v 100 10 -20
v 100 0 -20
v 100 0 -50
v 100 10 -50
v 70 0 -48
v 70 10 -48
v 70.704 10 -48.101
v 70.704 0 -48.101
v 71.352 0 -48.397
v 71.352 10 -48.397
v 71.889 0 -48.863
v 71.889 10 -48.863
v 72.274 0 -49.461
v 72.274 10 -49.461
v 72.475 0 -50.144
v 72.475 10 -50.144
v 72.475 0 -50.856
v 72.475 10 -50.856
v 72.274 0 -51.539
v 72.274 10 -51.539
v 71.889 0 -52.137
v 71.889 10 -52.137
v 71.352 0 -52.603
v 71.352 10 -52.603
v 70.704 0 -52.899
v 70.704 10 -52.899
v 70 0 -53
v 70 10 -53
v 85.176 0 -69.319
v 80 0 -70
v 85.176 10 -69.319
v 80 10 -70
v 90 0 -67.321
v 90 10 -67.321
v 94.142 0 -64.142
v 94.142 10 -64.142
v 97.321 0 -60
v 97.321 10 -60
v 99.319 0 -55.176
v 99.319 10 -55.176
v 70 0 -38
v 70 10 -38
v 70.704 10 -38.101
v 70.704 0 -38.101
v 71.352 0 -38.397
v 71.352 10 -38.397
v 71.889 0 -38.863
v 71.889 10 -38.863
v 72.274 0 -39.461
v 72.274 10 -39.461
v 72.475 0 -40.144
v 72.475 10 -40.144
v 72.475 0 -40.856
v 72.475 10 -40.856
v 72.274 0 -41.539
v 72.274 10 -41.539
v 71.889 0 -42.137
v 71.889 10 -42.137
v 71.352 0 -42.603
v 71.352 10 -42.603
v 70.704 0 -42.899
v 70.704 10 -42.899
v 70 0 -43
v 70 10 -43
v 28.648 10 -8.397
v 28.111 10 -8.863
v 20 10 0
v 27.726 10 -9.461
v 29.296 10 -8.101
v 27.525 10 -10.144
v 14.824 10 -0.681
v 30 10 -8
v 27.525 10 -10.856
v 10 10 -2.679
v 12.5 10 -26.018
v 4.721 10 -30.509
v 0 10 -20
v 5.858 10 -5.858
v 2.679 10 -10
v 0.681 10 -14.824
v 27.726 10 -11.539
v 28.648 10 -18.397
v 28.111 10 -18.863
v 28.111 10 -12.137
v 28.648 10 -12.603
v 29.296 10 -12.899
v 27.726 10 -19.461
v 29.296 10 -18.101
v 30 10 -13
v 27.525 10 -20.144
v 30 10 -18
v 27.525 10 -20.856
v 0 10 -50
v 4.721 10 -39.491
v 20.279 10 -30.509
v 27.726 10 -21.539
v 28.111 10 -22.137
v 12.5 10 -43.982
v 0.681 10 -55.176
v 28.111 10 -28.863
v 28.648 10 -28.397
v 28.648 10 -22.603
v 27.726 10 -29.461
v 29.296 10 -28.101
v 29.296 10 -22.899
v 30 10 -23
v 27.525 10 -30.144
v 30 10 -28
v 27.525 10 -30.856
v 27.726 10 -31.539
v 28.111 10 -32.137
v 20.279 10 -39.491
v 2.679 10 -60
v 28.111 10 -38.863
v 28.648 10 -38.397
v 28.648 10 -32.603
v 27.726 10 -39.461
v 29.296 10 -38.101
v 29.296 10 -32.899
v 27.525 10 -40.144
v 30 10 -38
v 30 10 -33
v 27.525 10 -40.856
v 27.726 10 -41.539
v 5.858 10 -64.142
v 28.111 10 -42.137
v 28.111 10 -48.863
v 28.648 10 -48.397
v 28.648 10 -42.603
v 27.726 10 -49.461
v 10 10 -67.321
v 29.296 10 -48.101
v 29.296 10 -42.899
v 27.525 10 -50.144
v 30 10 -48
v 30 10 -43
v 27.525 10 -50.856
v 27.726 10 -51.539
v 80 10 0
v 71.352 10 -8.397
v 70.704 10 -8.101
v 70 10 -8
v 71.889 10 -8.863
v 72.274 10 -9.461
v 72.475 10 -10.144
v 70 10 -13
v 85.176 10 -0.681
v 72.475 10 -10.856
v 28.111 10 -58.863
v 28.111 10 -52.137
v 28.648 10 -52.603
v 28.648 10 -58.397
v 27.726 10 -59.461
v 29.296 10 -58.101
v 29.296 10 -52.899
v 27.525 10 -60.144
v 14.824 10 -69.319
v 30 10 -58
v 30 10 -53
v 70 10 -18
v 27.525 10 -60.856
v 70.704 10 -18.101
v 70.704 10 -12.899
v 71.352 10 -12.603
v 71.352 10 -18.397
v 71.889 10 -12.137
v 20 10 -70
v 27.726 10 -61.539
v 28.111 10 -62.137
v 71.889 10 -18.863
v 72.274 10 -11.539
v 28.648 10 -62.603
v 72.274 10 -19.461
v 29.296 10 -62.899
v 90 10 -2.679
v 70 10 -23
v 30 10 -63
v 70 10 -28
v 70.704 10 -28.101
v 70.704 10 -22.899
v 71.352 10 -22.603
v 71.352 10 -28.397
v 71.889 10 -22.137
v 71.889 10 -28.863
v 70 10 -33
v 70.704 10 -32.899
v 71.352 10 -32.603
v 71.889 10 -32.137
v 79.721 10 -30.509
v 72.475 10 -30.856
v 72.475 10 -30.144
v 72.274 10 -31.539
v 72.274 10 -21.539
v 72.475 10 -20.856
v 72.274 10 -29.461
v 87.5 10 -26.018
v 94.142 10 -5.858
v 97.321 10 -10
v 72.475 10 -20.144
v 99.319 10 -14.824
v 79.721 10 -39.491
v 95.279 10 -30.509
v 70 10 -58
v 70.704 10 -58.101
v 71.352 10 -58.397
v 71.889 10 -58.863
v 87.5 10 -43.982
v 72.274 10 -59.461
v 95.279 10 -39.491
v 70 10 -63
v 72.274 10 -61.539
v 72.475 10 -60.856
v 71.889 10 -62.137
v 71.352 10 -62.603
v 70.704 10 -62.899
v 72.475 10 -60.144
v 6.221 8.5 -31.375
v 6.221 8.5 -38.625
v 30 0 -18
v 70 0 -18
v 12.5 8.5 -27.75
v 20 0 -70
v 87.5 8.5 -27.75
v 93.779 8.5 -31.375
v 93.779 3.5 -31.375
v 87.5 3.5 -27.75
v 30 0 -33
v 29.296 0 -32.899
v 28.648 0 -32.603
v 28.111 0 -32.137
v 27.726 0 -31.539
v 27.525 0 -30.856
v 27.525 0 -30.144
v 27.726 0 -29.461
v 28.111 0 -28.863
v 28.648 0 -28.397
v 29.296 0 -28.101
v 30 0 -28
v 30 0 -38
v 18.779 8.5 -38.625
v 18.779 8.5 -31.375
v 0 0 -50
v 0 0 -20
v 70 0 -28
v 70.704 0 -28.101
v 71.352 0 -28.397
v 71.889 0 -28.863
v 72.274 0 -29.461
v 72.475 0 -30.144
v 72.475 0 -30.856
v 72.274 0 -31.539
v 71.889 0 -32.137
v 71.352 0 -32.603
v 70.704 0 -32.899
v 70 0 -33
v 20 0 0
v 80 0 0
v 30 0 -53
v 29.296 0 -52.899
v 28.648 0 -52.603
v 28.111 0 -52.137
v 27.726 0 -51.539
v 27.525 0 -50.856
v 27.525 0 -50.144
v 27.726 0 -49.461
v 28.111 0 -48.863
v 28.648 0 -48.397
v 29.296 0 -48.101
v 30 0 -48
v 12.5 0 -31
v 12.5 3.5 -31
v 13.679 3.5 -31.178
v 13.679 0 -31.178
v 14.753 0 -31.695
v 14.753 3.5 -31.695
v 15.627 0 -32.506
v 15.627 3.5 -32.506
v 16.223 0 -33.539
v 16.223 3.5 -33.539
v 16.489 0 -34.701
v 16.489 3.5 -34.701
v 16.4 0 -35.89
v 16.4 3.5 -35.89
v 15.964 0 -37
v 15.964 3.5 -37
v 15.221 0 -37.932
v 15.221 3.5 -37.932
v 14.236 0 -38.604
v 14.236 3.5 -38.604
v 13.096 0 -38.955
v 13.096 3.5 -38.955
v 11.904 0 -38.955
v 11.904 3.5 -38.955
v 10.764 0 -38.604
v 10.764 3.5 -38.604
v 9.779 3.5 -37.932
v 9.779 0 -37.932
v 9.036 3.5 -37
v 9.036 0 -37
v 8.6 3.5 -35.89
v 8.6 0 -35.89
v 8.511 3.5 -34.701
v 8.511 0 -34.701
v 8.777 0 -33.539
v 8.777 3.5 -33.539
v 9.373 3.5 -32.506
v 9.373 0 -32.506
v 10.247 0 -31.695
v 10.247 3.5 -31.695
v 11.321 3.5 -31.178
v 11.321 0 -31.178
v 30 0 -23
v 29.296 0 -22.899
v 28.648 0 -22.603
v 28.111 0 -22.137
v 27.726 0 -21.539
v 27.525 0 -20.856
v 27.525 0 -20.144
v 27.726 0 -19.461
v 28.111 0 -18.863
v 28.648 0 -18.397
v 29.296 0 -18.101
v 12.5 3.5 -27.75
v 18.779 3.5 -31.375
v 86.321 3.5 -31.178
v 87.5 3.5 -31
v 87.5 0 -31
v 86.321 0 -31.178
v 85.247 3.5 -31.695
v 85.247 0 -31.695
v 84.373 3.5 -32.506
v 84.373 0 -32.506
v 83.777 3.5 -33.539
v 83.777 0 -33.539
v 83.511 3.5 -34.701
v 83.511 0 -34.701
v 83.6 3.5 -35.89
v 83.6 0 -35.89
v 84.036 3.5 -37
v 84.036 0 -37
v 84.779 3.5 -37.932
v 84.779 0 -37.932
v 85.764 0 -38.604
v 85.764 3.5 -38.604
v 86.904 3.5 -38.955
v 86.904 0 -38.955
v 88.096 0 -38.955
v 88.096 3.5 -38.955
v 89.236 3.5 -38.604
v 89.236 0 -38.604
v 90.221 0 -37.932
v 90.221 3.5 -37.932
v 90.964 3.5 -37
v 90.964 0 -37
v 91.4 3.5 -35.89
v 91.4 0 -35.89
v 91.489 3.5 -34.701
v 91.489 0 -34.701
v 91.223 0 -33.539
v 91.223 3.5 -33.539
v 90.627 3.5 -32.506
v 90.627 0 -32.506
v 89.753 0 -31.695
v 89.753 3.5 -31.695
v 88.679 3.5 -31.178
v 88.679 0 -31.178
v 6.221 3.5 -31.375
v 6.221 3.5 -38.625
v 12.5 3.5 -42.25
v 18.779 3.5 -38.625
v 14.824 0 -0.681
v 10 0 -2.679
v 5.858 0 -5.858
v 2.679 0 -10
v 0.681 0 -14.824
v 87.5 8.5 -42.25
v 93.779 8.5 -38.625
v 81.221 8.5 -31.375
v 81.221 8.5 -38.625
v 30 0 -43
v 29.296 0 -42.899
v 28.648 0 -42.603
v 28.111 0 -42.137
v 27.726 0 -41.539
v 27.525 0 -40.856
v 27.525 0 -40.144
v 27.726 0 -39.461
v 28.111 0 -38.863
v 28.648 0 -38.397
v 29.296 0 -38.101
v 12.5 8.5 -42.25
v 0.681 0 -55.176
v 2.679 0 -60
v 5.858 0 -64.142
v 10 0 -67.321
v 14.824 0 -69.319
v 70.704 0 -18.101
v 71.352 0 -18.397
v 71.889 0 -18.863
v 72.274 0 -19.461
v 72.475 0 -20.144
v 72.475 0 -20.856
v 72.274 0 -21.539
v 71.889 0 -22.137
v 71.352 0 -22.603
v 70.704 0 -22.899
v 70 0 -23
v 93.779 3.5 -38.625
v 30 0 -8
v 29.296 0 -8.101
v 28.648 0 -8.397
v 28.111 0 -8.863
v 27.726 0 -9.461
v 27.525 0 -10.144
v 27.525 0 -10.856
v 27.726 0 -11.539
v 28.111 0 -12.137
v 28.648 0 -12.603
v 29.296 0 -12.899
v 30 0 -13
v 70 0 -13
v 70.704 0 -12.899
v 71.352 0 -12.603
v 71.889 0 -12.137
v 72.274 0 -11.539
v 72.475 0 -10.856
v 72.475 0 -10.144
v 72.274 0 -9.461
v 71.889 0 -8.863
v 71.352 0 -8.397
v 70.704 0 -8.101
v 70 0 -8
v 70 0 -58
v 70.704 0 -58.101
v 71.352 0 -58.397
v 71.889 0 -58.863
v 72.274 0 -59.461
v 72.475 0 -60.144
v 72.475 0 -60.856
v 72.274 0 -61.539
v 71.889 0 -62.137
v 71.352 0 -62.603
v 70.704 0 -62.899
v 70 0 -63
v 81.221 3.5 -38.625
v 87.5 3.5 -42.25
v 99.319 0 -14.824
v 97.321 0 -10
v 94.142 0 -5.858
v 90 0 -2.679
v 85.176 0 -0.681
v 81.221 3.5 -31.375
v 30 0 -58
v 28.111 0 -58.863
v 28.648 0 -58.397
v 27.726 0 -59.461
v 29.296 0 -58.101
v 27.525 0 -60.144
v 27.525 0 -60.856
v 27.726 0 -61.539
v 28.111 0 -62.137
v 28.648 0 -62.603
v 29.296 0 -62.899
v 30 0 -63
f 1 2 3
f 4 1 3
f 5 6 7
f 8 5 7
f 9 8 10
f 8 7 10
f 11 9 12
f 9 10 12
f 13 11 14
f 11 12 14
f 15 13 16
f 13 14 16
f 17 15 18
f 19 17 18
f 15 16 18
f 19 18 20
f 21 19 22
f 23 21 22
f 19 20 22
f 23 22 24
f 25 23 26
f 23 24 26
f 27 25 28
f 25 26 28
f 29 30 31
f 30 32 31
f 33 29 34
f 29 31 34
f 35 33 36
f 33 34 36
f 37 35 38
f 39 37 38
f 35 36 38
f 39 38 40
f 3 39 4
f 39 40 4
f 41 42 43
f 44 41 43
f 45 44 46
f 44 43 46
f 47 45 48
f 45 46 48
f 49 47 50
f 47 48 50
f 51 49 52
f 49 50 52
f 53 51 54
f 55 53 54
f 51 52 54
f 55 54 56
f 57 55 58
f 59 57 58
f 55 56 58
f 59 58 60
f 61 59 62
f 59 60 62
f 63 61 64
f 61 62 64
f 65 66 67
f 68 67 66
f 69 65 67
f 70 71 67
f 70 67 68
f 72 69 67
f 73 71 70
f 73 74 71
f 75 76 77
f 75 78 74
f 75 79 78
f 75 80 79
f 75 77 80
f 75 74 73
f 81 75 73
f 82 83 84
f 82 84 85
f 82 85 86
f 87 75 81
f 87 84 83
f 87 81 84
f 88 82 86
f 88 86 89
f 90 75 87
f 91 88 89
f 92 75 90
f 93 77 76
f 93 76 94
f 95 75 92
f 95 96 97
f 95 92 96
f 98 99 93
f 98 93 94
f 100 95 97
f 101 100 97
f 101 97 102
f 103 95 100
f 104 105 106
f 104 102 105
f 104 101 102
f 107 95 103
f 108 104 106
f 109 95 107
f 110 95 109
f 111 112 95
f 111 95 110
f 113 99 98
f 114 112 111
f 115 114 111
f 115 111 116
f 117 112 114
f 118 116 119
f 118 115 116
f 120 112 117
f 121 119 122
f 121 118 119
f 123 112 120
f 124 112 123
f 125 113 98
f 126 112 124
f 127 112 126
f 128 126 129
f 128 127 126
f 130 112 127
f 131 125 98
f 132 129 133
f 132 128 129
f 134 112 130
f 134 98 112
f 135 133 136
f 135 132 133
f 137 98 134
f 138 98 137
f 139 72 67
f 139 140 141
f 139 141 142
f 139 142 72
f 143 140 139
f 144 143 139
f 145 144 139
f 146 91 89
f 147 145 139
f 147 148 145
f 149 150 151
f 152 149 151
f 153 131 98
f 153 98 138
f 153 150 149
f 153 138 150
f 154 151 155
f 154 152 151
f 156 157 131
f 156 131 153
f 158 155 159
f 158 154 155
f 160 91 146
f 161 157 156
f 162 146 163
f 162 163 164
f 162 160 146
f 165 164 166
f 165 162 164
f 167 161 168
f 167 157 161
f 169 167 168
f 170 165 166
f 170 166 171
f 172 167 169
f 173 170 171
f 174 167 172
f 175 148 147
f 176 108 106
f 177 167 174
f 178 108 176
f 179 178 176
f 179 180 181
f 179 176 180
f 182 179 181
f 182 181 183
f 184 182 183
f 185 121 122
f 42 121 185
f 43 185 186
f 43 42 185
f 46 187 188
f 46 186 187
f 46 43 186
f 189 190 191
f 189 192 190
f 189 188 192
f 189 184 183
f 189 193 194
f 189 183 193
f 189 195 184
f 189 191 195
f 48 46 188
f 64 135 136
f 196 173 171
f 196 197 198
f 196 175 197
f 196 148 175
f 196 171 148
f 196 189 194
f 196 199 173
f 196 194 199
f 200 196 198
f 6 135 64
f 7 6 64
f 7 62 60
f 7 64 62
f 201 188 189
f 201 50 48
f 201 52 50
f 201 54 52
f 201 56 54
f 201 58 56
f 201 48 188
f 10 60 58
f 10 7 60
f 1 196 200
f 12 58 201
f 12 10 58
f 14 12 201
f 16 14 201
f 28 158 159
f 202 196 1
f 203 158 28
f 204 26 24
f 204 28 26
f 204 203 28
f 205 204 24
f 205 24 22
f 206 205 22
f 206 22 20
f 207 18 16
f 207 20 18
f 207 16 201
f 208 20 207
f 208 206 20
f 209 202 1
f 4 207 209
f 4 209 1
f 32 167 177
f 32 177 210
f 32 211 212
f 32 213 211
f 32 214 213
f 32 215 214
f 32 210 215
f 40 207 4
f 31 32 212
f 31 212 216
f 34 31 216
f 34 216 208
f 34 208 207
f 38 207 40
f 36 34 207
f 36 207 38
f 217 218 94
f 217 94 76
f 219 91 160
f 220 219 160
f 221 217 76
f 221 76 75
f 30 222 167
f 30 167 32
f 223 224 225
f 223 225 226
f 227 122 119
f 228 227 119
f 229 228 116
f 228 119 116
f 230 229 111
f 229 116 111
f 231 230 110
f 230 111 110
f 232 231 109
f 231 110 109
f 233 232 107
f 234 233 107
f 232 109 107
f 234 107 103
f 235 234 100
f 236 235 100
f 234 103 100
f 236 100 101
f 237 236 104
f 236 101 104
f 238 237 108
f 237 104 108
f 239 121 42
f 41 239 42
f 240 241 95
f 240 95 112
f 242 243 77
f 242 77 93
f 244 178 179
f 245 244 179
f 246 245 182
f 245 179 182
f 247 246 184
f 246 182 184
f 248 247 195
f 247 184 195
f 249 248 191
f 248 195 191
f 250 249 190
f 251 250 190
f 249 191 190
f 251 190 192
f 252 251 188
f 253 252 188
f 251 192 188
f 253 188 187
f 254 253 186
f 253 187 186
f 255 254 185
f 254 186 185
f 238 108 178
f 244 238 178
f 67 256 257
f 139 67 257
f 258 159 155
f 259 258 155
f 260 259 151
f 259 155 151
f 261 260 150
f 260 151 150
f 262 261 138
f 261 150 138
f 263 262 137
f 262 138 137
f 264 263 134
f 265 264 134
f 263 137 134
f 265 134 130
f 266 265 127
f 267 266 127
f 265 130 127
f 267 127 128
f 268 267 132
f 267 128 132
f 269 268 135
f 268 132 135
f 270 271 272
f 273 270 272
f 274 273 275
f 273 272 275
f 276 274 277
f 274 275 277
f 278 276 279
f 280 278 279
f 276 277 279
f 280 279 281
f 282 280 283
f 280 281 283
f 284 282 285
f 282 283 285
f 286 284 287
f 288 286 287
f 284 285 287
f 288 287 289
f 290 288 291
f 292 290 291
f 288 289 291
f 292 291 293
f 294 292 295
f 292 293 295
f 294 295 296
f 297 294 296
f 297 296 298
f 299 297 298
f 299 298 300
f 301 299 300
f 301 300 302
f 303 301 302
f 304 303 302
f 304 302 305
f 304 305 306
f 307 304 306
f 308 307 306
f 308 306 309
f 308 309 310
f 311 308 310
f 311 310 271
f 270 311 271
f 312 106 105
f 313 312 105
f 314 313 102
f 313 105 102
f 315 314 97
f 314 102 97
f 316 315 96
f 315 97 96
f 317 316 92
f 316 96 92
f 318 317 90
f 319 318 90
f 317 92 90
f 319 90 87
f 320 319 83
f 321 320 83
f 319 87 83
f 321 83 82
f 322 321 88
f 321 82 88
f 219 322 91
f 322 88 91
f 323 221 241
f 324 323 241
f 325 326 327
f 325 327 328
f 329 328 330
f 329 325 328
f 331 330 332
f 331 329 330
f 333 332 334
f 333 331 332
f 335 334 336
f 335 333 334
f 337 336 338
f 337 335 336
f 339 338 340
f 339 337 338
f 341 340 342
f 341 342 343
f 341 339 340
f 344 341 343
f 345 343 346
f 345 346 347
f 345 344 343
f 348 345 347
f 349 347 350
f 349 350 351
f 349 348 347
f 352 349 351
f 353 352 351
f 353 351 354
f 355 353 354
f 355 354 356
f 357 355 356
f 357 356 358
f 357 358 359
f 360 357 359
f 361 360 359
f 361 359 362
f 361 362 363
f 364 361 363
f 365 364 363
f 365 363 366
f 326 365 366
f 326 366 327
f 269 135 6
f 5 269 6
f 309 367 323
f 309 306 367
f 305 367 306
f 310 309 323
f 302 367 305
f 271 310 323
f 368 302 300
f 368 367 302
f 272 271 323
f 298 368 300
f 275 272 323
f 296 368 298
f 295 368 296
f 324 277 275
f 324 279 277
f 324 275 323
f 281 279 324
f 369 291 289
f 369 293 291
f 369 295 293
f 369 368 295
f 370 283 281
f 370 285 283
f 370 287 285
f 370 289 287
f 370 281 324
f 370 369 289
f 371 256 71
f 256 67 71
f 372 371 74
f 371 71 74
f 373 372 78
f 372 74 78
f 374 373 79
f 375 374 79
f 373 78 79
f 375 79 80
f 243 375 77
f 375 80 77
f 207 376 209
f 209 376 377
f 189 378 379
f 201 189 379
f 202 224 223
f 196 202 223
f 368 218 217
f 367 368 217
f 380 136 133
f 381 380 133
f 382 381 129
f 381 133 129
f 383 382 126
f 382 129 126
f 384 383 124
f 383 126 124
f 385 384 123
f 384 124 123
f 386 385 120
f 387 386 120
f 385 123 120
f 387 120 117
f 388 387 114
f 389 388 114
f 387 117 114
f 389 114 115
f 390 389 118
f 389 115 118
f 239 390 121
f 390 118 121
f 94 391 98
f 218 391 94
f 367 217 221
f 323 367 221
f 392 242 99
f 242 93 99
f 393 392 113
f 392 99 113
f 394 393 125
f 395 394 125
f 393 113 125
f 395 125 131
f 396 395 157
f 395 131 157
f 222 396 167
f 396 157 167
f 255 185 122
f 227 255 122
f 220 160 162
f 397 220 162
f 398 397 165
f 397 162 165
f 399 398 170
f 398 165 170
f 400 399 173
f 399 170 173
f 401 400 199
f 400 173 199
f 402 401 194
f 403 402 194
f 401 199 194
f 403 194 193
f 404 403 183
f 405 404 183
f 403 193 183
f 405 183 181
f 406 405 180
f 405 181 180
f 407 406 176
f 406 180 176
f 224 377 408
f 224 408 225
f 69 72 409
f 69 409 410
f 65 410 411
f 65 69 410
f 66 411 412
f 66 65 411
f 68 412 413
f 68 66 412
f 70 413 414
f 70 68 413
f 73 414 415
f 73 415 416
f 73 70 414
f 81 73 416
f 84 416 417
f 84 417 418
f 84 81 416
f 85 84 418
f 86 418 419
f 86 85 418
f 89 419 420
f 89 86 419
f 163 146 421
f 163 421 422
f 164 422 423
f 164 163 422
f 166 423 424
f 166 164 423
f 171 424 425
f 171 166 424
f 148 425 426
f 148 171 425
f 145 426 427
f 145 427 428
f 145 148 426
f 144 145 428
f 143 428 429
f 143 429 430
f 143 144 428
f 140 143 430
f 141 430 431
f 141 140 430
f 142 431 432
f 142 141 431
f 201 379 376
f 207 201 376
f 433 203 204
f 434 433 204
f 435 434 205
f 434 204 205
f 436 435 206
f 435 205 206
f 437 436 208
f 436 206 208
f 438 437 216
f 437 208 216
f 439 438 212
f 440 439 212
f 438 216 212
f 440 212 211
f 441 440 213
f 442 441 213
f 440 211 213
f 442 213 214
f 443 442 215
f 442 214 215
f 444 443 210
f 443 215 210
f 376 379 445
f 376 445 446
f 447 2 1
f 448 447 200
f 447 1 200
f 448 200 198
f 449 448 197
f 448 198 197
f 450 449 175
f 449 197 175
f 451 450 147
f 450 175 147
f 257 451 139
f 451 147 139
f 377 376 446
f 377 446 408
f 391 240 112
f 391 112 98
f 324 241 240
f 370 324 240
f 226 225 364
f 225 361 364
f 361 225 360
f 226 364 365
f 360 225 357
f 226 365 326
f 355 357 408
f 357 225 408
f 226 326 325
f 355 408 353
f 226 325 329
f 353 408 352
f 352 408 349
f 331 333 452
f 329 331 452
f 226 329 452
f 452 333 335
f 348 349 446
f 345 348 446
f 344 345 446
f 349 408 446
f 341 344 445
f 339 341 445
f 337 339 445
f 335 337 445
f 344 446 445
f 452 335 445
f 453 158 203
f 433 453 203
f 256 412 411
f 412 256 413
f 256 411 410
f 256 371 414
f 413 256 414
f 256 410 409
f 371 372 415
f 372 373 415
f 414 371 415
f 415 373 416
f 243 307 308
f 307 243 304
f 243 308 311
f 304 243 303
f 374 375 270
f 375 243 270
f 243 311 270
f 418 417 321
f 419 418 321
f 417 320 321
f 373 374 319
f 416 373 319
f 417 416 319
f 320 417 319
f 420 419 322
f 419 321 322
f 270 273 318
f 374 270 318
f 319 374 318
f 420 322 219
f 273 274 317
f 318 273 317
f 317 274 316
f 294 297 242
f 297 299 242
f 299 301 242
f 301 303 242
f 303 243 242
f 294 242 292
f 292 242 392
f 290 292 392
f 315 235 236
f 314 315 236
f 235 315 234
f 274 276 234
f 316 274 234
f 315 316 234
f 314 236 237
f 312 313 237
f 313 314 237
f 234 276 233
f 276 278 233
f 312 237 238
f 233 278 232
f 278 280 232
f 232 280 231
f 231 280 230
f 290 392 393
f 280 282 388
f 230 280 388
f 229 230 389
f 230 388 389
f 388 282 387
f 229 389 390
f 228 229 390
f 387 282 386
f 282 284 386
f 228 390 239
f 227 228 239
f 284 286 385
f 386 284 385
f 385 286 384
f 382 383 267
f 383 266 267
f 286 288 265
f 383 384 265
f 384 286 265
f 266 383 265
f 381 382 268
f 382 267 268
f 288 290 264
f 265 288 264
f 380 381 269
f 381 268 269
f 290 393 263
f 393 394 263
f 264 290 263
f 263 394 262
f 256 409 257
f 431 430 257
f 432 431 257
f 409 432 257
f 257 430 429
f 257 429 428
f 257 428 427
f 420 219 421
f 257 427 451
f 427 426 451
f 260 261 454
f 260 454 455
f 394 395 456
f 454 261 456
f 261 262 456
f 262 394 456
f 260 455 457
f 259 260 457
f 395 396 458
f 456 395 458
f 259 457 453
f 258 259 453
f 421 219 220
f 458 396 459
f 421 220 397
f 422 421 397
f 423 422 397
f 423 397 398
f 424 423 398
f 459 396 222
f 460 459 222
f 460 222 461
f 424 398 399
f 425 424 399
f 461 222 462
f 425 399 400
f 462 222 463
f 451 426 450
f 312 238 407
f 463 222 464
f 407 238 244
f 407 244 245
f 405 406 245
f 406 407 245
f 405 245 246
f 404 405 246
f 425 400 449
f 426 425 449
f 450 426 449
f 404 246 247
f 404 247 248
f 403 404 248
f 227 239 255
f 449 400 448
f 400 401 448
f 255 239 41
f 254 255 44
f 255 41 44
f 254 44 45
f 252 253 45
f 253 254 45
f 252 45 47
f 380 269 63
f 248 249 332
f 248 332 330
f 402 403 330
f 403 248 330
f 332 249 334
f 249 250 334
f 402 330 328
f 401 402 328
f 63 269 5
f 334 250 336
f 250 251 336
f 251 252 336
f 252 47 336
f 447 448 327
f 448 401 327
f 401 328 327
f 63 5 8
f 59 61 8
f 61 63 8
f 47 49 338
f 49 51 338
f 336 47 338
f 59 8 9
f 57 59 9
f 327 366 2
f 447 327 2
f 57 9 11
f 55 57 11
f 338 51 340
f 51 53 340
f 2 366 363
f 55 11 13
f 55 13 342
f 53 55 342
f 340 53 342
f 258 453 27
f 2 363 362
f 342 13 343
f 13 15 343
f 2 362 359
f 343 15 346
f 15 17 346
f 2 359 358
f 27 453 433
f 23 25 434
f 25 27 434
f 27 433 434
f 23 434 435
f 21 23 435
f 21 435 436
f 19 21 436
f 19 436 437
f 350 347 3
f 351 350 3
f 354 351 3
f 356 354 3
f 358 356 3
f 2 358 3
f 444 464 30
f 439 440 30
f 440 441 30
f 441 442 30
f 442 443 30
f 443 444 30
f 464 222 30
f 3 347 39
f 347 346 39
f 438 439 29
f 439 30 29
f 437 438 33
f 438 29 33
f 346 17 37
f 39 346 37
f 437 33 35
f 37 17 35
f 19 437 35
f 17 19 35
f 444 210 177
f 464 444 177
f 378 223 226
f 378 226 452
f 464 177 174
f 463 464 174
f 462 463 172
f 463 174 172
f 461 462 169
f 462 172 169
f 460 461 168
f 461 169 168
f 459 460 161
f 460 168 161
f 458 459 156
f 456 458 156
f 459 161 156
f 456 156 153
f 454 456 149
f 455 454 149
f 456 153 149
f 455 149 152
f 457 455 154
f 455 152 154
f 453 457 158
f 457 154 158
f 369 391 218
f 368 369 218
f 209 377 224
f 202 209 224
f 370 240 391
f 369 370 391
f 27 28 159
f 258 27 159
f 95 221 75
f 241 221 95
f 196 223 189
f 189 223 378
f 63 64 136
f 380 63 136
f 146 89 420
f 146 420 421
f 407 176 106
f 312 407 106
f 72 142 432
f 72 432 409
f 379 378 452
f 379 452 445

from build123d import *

# Parameters (mm, degrees)
CROQUIS1_W                 = 100
CROQUIS1_H                 = 70
SALIENTE_EXTRUIR1_DEPTH    = 10
CORTAR_EXTRUIR1_DEPTH      = 6.5
CROQUIS5_R                 = 4
CORTAR_EXTRUIR2_DEPTH      = 10
CHAFL_N1_SIZE              = 1.5
CHAFL_N1_OF_SIMETR_A1_SIZE = 1.5
REDONDEO4_R                = 20
REDONDEO5_R                = 20
REDONDEO6_R                = 20
REDONDEO7_R                = 20
CORTAR_EXTRUIR3_DEPTH      = 10


with BuildPart() as part:
    # Croquis1 → Saliente-Extruir1 (new body)
    with BuildSketch(Plane(origin=(0, 0, 0), x_dir=(1, 0, 0), z_dir=(0, 1, 0))):
        with Locations((50, 35)):
            Rectangle(CROQUIS1_W, CROQUIS1_H)
    extrude(amount=SALIENTE_EXTRUIR1_DEPTH)

    # Croquis2 → Cortar-Extruir1 (cut)
    with BuildSketch(Plane(origin=(0, 10, 0), x_dir=(1, 0, 0), z_dir=(0, 1, 0))):
        Polygon((12.5, 42.25), (6.221315823, 38.625), (6.221315823, 31.375), (12.5, 27.75), (18.778684177, 31.375), (18.778684177, 38.625), align=None)
    cortar_extruir1 = extrude(amount=-CORTAR_EXTRUIR1_DEPTH, mode=Mode.SUBTRACT)

    # Croquis5 → Cortar-Extruir2 (cut)
    with BuildSketch(Plane(origin=(0, 10, 0), x_dir=(1, 0, 0), z_dir=(0, 1, 0))):
        with Locations(Location((12.5, 35, 0), (0, 0, 270))):
            Circle(CROQUIS5_R)
    cortar_extruir2 = extrude(amount=-CORTAR_EXTRUIR2_DEPTH, mode=Mode.SUBTRACT)

    # Chaflán1
    chafl_n1_edges = [part.edges().sort_by_distance(p)[0] for p in [
        (15.639342089, 10, -40.4375),
        (9.360657911, 10, -40.4375),
        (6.221315823, 10, -35),
        (9.360657911, 10, -29.5625),
        (15.639342089, 10, -29.5625),
        (18.778684177, 10, -35),
    ]]
    chamfer(chafl_n1_edges, length=CHAFL_N1_SIZE)

    # Simetría1: Cortar-Extruir1, Cortar-Extruir2 across plane
    add(cortar_extruir1.mirror(Plane.ZY.offset(-50)), mode=Mode.SUBTRACT)
    add(cortar_extruir2.mirror(Plane.ZY.offset(-50)), mode=Mode.SUBTRACT)

    # Chaflán1 of Simetría1
    chafl_n1_of_simetr_a1_edges = [part.edges().sort_by_distance(p)[0] for p in [
        (84.360657911, 10, -40.4375),
        (90.639342089, 10, -40.4375),
        (93.778684177, 10, -35),
        (90.639342089, 10, -29.5625),
        (84.360657911, 10, -29.5625),
        (81.221315823, 10, -35),
    ]]
    chamfer(chafl_n1_of_simetr_a1_edges, length=CHAFL_N1_OF_SIMETR_A1_SIZE)

    # Redondeo4
    redondeo4_edges = [part.edges().sort_by_distance(p)[0] for p in [
        (100, 5, -70),
    ]]
    fillet(redondeo4_edges, radius=REDONDEO4_R)

    # Redondeo5
    redondeo5_edges = [part.edges().sort_by_distance(p)[0] for p in [
        (100, 5, 0),
    ]]
    fillet(redondeo5_edges, radius=REDONDEO5_R)

    # Redondeo6
    redondeo6_edges = [part.edges().sort_by_distance(p)[0] for p in [
        (0, 5, 0),
    ]]
    fillet(redondeo6_edges, radius=REDONDEO6_R)

    # Redondeo7
    redondeo7_edges = [part.edges().sort_by_distance(p)[0] for p in [
        (0, 5, -70),
    ]]
    fillet(redondeo7_edges, radius=REDONDEO7_R)

    # Croquis7 → Cortar-Extruir3 (cut)
    with BuildSketch(Plane(origin=(0, 10, 0), x_dir=(1, 0, 0), z_dir=(0, 1, 0))):
        with BuildLine():
            Line((30, 13), (70, 13))
            ThreePointArc((70, 13), (72.5, 10.5), (70, 8))
            Line((70, 8), (30, 8))
            ThreePointArc((30, 8), (27.5, 10.5), (30, 13))
        make_face()
        with BuildLine():
            Line((30, 18), (70, 18))
            ThreePointArc((70, 18), (72.5, 20.5), (70, 23))
            Line((70, 23), (30, 23))
            ThreePointArc((30, 23), (27.5, 20.5), (30, 18))
        make_face()
        with BuildLine():
            Line((30, 28), (70, 28))
            ThreePointArc((70, 28), (72.5, 30.5), (70, 33))
            Line((70, 33), (30, 33))
            ThreePointArc((30, 33), (27.5, 30.5), (30, 28))
        make_face()
        with BuildLine():
            Line((30, 38), (70, 38))
            ThreePointArc((70, 38), (72.5, 40.5), (70, 43))
            Line((70, 43), (30, 43))
            ThreePointArc((30, 43), (27.5, 40.5), (30, 38))
        make_face()
        with BuildLine():
            Line((30, 48), (70, 48))
            ThreePointArc((70, 48), (72.5, 50.5), (70, 53))
            Line((70, 53), (30, 53))
            ThreePointArc((30, 53), (27.5, 50.5), (30, 48))
        make_face()
        with BuildLine():
            Line((30, 58), (70, 58))
            ThreePointArc((70, 58), (72.5, 60.5), (70, 63))
            Line((70, 63), (30, 63))
            ThreePointArc((30, 63), (27.5, 60.5), (30, 58))
        make_face()
    extrude(amount=-CORTAR_EXTRUIR3_DEPTH, mode=Mode.SUBTRACT)


solid = part.part
